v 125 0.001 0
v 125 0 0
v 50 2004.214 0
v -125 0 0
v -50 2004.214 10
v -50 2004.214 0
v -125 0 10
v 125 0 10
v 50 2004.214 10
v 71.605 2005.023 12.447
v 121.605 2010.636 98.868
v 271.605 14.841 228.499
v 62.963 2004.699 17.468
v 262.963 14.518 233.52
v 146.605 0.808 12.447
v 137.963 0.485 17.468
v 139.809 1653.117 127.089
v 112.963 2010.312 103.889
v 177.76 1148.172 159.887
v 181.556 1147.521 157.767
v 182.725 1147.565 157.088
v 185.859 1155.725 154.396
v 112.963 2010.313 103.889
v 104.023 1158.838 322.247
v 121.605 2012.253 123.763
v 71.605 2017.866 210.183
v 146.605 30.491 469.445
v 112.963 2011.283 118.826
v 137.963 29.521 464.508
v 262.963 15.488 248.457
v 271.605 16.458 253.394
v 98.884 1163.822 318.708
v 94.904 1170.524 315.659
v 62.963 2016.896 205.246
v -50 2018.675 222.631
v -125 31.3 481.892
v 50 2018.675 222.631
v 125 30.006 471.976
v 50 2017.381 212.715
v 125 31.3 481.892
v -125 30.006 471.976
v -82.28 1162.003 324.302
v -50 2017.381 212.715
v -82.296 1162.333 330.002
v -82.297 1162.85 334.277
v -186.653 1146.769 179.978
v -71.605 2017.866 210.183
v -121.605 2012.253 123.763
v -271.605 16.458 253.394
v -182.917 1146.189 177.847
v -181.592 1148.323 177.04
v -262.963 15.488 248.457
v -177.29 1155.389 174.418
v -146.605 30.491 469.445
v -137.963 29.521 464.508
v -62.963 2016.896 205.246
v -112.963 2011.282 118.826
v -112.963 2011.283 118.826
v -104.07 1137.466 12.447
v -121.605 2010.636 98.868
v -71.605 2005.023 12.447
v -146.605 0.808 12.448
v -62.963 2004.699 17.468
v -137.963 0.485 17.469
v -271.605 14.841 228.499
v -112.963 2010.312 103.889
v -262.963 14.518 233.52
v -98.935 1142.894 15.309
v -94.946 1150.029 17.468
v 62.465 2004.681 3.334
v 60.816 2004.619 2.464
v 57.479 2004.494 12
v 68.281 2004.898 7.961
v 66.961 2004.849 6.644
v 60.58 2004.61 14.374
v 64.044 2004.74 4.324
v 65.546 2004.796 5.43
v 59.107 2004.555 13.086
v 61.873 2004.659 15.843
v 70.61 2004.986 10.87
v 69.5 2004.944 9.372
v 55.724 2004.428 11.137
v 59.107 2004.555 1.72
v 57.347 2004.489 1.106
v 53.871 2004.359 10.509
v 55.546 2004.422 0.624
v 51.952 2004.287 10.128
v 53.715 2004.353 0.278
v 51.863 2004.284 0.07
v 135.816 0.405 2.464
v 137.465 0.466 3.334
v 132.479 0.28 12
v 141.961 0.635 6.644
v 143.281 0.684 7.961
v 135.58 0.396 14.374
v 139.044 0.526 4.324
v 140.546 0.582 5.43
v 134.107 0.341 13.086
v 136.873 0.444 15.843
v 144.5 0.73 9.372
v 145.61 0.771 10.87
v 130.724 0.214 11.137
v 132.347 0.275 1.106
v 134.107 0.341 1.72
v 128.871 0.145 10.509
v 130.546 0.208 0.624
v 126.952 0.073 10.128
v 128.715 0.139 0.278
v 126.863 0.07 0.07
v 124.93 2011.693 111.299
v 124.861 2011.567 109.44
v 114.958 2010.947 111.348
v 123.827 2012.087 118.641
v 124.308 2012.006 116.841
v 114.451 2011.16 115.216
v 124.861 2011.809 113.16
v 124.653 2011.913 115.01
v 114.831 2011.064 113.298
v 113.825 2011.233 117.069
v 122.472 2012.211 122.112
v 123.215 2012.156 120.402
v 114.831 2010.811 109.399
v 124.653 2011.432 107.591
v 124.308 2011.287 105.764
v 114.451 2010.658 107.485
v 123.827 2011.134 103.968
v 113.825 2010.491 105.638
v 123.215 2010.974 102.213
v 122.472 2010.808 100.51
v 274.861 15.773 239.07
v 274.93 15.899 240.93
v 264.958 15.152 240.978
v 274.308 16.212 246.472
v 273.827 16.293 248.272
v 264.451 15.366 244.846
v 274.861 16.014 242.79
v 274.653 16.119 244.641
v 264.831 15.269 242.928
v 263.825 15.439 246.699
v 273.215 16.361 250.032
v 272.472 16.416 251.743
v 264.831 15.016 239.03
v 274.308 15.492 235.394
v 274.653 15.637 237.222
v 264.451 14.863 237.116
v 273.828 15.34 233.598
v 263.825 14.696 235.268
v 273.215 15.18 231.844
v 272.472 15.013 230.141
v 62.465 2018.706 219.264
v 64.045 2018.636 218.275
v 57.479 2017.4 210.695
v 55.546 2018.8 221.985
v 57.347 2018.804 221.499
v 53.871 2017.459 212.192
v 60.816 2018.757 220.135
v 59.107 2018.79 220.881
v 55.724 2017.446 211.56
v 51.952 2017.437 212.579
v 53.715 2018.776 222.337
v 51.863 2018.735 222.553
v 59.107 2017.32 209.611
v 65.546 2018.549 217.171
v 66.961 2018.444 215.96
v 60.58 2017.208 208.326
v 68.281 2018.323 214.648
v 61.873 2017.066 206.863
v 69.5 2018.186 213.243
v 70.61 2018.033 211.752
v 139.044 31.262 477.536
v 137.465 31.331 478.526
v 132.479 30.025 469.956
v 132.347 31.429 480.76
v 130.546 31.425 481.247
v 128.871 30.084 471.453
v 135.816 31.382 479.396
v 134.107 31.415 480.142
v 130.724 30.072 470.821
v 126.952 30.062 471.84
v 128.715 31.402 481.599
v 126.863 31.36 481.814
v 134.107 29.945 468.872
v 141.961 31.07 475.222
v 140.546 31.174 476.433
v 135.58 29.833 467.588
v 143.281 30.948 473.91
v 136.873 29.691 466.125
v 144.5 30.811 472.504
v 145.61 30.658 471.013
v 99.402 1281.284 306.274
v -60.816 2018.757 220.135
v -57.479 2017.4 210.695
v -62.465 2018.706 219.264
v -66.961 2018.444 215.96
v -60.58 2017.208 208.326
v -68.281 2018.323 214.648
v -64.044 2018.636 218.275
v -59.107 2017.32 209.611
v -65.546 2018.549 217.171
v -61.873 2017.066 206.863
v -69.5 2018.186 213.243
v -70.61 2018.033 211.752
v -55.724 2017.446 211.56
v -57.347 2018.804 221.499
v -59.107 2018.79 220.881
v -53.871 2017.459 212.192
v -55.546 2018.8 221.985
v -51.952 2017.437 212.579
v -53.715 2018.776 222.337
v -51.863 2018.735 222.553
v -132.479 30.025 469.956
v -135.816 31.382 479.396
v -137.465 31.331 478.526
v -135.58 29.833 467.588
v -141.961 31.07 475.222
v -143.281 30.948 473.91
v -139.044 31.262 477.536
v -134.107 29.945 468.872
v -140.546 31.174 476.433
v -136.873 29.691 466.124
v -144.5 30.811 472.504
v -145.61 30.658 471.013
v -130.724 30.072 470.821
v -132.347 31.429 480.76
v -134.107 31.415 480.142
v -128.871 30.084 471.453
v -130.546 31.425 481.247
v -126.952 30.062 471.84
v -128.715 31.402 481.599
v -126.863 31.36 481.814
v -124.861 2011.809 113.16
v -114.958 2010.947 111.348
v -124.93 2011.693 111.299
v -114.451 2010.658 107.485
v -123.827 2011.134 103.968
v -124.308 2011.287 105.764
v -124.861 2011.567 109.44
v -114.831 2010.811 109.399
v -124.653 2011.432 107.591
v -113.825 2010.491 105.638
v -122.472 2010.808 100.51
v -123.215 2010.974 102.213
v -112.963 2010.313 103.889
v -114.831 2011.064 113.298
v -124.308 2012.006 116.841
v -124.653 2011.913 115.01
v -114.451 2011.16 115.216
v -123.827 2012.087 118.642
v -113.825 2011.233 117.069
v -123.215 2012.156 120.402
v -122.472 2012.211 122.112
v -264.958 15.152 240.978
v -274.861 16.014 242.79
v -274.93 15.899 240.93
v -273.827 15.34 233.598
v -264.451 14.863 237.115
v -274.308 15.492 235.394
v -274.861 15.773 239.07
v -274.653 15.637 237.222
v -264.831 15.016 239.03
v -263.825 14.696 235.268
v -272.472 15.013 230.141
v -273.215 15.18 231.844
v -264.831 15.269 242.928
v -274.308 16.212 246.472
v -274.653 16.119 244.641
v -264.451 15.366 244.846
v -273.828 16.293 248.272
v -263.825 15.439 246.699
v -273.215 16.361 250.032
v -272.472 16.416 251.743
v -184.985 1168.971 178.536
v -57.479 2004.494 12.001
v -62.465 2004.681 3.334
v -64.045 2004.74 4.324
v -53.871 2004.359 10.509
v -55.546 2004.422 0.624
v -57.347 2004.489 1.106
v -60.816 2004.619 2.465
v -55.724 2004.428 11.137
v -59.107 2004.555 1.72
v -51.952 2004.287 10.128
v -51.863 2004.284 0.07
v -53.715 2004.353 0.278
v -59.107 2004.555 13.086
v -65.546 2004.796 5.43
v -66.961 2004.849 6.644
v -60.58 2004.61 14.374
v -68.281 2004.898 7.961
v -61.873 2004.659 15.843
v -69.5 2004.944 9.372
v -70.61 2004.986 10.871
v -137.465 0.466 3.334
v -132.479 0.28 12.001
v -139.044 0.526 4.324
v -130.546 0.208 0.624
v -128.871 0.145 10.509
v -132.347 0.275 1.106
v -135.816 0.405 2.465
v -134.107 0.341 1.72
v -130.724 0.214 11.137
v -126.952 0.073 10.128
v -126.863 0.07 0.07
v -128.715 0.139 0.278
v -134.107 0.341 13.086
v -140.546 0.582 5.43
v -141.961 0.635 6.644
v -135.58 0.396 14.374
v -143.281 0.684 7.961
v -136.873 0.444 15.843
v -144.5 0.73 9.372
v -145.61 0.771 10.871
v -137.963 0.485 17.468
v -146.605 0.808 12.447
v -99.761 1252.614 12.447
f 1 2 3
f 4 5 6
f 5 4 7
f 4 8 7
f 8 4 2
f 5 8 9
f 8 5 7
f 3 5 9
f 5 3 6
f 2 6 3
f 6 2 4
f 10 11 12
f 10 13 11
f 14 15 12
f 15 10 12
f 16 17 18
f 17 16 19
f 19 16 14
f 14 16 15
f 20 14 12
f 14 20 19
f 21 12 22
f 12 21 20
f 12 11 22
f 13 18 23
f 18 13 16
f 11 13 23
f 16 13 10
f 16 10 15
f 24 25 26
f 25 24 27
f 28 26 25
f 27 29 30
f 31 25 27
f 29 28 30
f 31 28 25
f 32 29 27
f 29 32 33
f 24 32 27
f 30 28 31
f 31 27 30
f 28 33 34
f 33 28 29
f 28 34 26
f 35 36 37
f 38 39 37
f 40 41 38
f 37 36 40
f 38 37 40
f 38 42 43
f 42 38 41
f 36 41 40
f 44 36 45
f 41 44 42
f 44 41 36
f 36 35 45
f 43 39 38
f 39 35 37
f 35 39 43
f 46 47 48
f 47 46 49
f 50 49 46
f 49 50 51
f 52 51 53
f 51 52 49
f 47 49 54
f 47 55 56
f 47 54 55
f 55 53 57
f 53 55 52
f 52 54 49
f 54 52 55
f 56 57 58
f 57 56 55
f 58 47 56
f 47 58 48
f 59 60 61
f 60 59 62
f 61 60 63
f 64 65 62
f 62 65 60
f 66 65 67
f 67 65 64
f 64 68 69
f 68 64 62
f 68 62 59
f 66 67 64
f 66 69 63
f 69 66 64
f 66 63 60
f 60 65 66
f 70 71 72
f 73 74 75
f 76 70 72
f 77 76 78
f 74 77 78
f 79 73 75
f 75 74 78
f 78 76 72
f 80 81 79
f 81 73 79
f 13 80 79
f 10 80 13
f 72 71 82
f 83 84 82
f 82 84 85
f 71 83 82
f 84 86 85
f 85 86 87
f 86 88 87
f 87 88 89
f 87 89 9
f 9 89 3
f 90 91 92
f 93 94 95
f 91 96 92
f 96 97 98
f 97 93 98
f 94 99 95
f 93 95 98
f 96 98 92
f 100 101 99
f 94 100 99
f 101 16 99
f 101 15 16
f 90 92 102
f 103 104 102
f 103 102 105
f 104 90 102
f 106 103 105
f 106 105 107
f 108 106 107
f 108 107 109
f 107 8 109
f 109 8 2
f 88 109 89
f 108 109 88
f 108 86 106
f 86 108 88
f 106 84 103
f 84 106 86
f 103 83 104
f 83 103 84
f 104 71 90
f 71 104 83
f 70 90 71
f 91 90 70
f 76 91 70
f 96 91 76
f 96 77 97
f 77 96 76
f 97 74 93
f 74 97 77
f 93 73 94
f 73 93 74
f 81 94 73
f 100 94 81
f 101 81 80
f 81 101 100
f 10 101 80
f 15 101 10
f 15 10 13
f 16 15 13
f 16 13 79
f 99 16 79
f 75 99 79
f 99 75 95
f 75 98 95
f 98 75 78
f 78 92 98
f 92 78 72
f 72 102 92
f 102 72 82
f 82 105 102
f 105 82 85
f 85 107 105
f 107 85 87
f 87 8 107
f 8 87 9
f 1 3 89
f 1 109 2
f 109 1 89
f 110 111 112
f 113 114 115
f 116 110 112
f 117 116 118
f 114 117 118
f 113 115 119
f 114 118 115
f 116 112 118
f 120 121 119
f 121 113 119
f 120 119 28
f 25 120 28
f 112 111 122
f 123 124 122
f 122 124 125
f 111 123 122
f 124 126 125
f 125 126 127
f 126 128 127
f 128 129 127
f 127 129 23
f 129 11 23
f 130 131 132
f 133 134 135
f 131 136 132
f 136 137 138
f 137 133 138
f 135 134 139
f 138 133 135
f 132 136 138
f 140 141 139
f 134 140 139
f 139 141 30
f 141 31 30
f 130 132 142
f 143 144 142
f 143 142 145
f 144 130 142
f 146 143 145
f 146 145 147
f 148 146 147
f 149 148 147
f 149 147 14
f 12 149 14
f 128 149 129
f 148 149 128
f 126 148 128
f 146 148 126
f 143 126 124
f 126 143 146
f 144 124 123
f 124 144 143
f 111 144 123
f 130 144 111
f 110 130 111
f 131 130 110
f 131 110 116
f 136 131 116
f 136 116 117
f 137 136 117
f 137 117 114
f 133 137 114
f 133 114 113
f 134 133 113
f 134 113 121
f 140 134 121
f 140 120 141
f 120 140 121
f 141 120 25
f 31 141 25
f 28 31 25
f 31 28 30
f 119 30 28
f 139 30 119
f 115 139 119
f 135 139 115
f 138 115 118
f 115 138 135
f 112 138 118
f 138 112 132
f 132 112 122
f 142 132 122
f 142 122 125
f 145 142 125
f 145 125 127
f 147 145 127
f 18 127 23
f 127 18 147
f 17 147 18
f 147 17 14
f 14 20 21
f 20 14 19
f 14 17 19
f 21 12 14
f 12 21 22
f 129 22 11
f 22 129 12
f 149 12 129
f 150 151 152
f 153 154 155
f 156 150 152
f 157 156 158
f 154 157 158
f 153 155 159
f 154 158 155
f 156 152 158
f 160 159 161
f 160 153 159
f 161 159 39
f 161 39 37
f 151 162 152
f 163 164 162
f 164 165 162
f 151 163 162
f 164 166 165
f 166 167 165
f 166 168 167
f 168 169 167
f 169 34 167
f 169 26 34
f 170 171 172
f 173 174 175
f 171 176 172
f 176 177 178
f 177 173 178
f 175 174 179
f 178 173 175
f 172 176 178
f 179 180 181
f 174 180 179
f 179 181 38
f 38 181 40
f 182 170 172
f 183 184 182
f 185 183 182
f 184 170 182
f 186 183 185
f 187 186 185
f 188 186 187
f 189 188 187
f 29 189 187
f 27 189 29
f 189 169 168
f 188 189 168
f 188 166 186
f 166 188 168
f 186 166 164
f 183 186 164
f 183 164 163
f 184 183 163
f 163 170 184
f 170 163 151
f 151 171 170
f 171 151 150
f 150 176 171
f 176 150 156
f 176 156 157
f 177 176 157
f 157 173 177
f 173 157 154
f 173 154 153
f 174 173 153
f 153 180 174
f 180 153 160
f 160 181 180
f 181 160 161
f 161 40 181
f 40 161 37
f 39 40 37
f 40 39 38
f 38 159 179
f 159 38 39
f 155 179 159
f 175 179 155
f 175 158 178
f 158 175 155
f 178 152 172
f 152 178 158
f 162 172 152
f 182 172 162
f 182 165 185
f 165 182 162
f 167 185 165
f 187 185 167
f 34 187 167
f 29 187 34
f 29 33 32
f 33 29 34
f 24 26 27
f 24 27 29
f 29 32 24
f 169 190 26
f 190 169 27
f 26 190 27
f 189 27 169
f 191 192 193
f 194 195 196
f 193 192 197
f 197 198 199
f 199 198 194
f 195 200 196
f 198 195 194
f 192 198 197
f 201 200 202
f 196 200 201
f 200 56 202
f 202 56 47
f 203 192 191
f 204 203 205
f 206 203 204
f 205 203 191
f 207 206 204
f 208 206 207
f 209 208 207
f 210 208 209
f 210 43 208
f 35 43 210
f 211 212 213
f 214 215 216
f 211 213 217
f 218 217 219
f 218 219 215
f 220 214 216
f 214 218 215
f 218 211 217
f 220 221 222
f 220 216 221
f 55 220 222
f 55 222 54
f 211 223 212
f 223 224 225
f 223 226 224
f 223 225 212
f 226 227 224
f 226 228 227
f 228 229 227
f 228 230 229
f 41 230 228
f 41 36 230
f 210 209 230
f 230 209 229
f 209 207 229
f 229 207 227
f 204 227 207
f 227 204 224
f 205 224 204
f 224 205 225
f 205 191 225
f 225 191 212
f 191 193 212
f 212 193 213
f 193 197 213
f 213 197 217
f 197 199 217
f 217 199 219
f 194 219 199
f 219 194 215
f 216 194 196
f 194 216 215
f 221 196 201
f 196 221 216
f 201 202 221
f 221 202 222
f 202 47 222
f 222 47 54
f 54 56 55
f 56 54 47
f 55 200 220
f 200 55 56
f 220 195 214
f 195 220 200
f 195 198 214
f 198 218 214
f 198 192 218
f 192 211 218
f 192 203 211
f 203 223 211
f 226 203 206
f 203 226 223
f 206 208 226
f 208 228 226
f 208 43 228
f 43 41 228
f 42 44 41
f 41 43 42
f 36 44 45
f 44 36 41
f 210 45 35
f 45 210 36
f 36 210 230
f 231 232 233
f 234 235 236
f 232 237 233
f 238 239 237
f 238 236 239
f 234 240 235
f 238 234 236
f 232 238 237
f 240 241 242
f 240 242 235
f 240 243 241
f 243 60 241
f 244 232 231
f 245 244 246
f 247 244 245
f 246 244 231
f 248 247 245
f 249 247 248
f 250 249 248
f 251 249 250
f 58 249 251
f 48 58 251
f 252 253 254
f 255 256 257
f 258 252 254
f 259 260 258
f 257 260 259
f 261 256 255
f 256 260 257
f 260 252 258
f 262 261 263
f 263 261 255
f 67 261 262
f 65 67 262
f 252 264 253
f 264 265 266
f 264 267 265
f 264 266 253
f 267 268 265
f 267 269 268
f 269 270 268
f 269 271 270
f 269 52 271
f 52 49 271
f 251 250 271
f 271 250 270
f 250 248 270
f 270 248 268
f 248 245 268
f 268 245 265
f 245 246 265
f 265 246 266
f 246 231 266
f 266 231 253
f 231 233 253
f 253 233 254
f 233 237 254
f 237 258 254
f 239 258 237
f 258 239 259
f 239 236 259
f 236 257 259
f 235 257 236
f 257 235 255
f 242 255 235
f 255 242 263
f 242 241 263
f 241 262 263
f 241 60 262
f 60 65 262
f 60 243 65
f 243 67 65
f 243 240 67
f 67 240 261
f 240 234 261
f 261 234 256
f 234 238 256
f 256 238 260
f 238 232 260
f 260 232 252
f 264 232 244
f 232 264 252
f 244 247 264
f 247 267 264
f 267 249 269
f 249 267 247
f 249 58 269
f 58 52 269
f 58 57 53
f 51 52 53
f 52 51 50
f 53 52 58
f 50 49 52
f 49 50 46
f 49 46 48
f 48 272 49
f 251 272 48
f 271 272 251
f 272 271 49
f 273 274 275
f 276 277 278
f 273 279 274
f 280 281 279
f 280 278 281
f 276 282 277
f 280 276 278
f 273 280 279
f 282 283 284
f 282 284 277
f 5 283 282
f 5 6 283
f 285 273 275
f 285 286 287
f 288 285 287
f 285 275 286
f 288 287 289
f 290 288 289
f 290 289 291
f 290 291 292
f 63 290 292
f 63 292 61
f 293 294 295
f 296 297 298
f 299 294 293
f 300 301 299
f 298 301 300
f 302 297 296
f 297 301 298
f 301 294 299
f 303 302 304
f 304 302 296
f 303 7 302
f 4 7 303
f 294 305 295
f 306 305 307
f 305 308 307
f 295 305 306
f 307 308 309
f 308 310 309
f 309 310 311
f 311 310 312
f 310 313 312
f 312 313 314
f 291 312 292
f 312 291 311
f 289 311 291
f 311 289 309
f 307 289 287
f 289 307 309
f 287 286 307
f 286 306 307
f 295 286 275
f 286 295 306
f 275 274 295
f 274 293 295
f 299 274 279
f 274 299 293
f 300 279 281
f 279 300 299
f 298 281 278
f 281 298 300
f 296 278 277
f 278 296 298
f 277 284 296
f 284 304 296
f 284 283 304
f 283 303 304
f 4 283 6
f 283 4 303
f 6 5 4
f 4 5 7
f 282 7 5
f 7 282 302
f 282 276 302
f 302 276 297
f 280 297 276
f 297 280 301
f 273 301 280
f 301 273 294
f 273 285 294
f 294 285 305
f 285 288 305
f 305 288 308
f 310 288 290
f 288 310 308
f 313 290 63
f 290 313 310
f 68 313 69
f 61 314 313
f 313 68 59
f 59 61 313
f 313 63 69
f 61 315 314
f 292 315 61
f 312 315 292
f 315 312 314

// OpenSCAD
// Generated by Parametrix
ca_sfTube_SFG_pattern_000 = [ [ -125.0000, 0.0000 ],[ 125.0000, 0.0000 ],[ 145.8808, 0.7814 ],[ 395.1816, 19.4658 ],[ 415.9456, 21.8056 ],[ 663.1527, 59.0699 ],[ 683.6838, 62.9550 ],[ 927.4145, 118.5907 ],[ 947.5978, 123.9994 ],[ 1186.4887, 197.6954 ],[ 1206.2113, 204.5974 ],[ 1438.9263, 295.9415 ],[ 1458.0779, 304.2982 ],[ 655.9711, 2142.5377 ],[ 636.8196, 2134.1810 ],[ 543.7336, 2097.6434 ],[ 524.0110, 2090.7414 ],[ 428.4546, 2061.2630 ],[ 408.2713, 2055.8544 ],[ 310.7790, 2033.6000 ],[ 290.2480, 2029.7150 ],[ 191.3651, 2014.8092 ],[ 170.6011, 2012.4695 ],[ 70.8808, 2004.9957 ],[ 50.0000, 2004.2143 ],[ -50.0000, 2004.2143 ],[ -125.0000, 0.0000 ] ];
cb_sfTube_SFG_pattern_000 = [  0, 1, 2, 3, 4, 5, 6, 7, 8, 9, 10, 11, 12, 13, 14, 15, 16, 17, 18, 19, 20, 21, 22, 23, 24, 25, 26 ];
ca_sfTube_SFG_pattern_001 = [ [ -125.0000, 0.0000 ],[ 125.0000, 0.0000 ],[ 145.8808, 0.7814 ],[ 395.1816, 19.4658 ],[ 415.9456, 21.8056 ],[ 663.1527, 59.0699 ],[ 683.6838, 62.9550 ],[ 927.4145, 118.5907 ],[ 947.5978, 123.9994 ],[ 1186.4887, 197.6954 ],[ 1206.2113, 204.5974 ],[ 1438.9263, 295.9415 ],[ 1458.0779, 304.2982 ],[ 655.9711, 2142.5377 ],[ 636.8196, 2134.1810 ],[ 543.7336, 2097.6434 ],[ 524.0110, 2090.7414 ],[ 428.4546, 2061.2630 ],[ 408.2713, 2055.8544 ],[ 310.7790, 2033.6000 ],[ 290.2480, 2029.7150 ],[ 191.3651, 2014.8092 ],[ 170.6011, 2012.4695 ],[ 70.8808, 2004.9957 ],[ 50.0000, 2004.2143 ],[ -50.0000, 2004.2143 ],[ -125.0000, 0.0000 ] ];
cb_sfTube_SFG_pattern_001 = [  27, 28, 29, 30, 31, 32, 33, 34, 35, 36, 37, 38, 39, 40, 41, 42, 43, 44, 45, 46, 47, 48, 49, 50, 51, 52, 53 ];
ca_sfTube_SFG_pattern_002 = [ [ 107.4189, 1001.8518 ],[ 107.6019, 1001.8757 ],[ 107.7774, 1001.9328 ],[ 107.9393, 1002.0212 ],[ 108.0824, 1002.1378 ],[ 108.2015, 1002.2788 ],[ 108.2927, 1002.4392 ],[ 108.3529, 1002.6136 ],[ 108.3800, 1002.7962 ],[ 108.3731, 1002.9806 ],[ 108.3324, 1003.1606 ],[ 108.2594, 1003.3300 ],[ 108.1564, 1003.4832 ],[ 108.0271, 1003.6148 ],[ 107.8758, 1003.7205 ],[ 107.7076, 1003.7965 ],[ 107.5284, 1003.8403 ],[ 107.3441, 1003.8504 ],[ 88.4619, 1003.1439 ],[ 88.2789, 1003.1200 ],[ 88.1034, 1003.0629 ],[ 87.9414, 1002.9745 ],[ 87.7984, 1002.8578 ],[ 87.6793, 1002.7169 ],[ 87.5881, 1002.5565 ],[ 87.5279, 1002.3821 ],[ 87.5008, 1002.1995 ],[ 87.5077, 1002.0151 ],[ 87.5484, 1001.8351 ],[ 87.6214, 1001.6656 ],[ 87.7244, 1001.5125 ],[ 87.8537, 1001.3809 ],[ 88.0050, 1001.2752 ],[ 88.1732, 1001.1992 ],[ 88.3524, 1001.1554 ],[ 88.5367, 1001.1452 ],[ 107.4189, 1001.8518 ] ];
cb_sfTube_SFG_pattern_002 = [  54, 55, 56, 57, 58, 59, 60, 61, 62, 63, 64, 65, 66, 67, 68, 69, 70, 71, 72, 73, 74, 75, 76, 77, 78, 79, 80, 81, 82, 83, 84, 85, 86, 87, 88, 89, 90 ];
ca_sfTube_SFG_pattern_003 = [ [ 302.7736, 1017.2017 ],[ 302.9543, 1017.2392 ],[ 303.1250, 1017.3093 ],[ 303.2800, 1017.4095 ],[ 303.4139, 1017.5365 ],[ 303.5221, 1017.6859 ],[ 303.6011, 1017.8527 ],[ 303.6481, 1018.0312 ],[ 303.6614, 1018.2152 ],[ 303.6408, 1018.3986 ],[ 303.5868, 1018.5751 ],[ 303.5013, 1018.7386 ],[ 303.3872, 1018.8836 ],[ 303.2484, 1019.0052 ],[ 303.0896, 1019.0992 ],[ 302.9162, 1019.1625 ],[ 302.7342, 1019.1928 ],[ 302.5497, 1019.1891 ],[ 283.7731, 1017.0733 ],[ 283.5924, 1017.0358 ],[ 283.4217, 1016.9658 ],[ 283.2667, 1016.8655 ],[ 283.1329, 1016.7385 ],[ 283.0246, 1016.5891 ],[ 282.9456, 1016.4223 ],[ 282.8986, 1016.2438 ],[ 282.8853, 1016.0598 ],[ 282.9059, 1015.8764 ],[ 282.9599, 1015.7000 ],[ 283.0454, 1015.5364 ],[ 283.1596, 1015.3914 ],[ 283.2984, 1015.2698 ],[ 283.4572, 1015.1758 ],[ 283.6305, 1015.1125 ],[ 283.8125, 1015.0822 ],[ 283.9970, 1015.0859 ],[ 302.7736, 1017.2017 ] ];
cb_sfTube_SFG_pattern_003 = [  91, 92, 93, 94, 95, 96, 97, 98, 99, 100, 101, 102, 103, 104, 105, 106, 107, 108, 109, 110, 111, 112, 113, 114, 115, 116, 117, 118, 119, 120, 121, 122, 123, 124, 125, 126, 127 ];
ca_sfTube_SFG_pattern_004 = [ [ 496.4348, 1047.1090 ],[ 496.6122, 1047.1599 ],[ 496.7772, 1047.2425 ],[ 496.9242, 1047.3541 ],[ 497.0482, 1047.4907 ],[ 497.1450, 1047.6478 ],[ 497.2113, 1047.8200 ],[ 497.2448, 1048.0015 ],[ 497.2444, 1048.1861 ],[ 497.2101, 1048.3674 ],[ 497.1430, 1048.5393 ],[ 497.0455, 1048.6960 ],[ 496.9209, 1048.8321 ],[ 496.7734, 1048.9430 ],[ 496.6080, 1049.0248 ],[ 496.4304, 1049.0750 ],[ 496.2466, 1049.0916 ],[ 496.0629, 1049.0741 ],[ 477.4970, 1045.5609 ],[ 477.3089, 1045.5058 ],[ 477.1351, 1045.4150 ],[ 476.9824, 1045.2920 ],[ 476.8567, 1045.1417 ],[ 476.7626, 1044.9696 ],[ 476.7040, 1044.7826 ],[ 476.6830, 1044.5877 ],[ 476.7004, 1044.3924 ],[ 476.7555, 1044.2043 ],[ 476.8463, 1044.0306 ],[ 476.9692, 1043.8779 ],[ 477.1196, 1043.7521 ],[ 477.2916, 1043.6581 ],[ 477.4787, 1043.5994 ],[ 477.6736, 1043.5784 ],[ 477.8688, 1043.5958 ],[ 496.4348, 1047.1090 ] ];
cb_sfTube_SFG_pattern_004 = [  128, 129, 130, 131, 132, 133, 134, 135, 136, 137, 138, 139, 140, 141, 142, 143, 144, 145, 146, 147, 148, 149, 150, 151, 152, 153, 154, 155, 156, 157, 158, 159, 160, 161, 162, 163 ];
ca_sfTube_SFG_pattern_005 = [ [ 687.3191, 1091.4064 ],[ 687.4922, 1091.4705 ],[ 687.6506, 1091.5652 ],[ 687.7888, 1091.6874 ],[ 687.9023, 1091.8329 ],[ 687.9871, 1091.9968 ],[ 688.0403, 1092.1735 ],[ 688.0601, 1092.3570 ],[ 688.0459, 1092.5410 ],[ 687.9982, 1092.7192 ],[ 687.9185, 1092.8857 ],[ 687.8095, 1093.0346 ],[ 687.6751, 1093.1610 ],[ 687.5197, 1093.2606 ],[ 687.3487, 1093.3299 ],[ 687.1678, 1093.3666 ],[ 686.9833, 1093.3694 ],[ 686.8014, 1093.3383 ],[ 668.5500, 1088.4473 ],[ 668.3769, 1088.3833 ],[ 668.2185, 1088.2886 ],[ 668.0803, 1088.1664 ],[ 667.9668, 1088.0208 ],[ 667.8820, 1087.8569 ],[ 667.8288, 1087.6802 ],[ 667.8089, 1087.4968 ],[ 667.8231, 1087.3128 ],[ 667.8709, 1087.1345 ],[ 667.9506, 1086.9681 ],[ 668.0595, 1086.8191 ],[ 668.1940, 1086.6927 ],[ 668.3494, 1086.5932 ],[ 668.5204, 1086.5239 ],[ 668.7013, 1086.4872 ],[ 668.8858, 1086.4844 ],[ 669.0677, 1086.5155 ],[ 687.3191, 1091.4064 ] ];
cb_sfTube_SFG_pattern_005 = [  164, 165, 166, 167, 168, 169, 170, 171, 172, 173, 174, 175, 176, 177, 178, 179, 180, 181, 182, 183, 184, 185, 186, 187, 188, 189, 190, 191, 192, 193, 194, 195, 196, 197, 198, 199, 200 ];
ca_sfTube_SFG_pattern_006 = [ [ 874.3589, 1149.8462 ],[ 874.5267, 1149.9230 ],[ 874.6776, 1150.0293 ],[ 874.8063, 1150.1615 ],[ 874.9086, 1150.3151 ],[ 874.9809, 1150.4849 ],[ 875.0207, 1150.6651 ],[ 875.0268, 1150.8495 ],[ 874.9989, 1151.0319 ],[ 874.9379, 1151.2061 ],[ 874.8460, 1151.3661 ],[ 874.7263, 1151.5065 ],[ 874.5827, 1151.6225 ],[ 874.4204, 1151.7102 ],[ 874.2446, 1151.7665 ],[ 874.0615, 1151.7896 ],[ 873.8773, 1151.7786 ],[ 873.6983, 1151.7340 ],[ 855.8634, 1145.4926 ],[ 855.6856, 1145.4100 ],[ 855.5274, 1145.2944 ],[ 855.3947, 1145.1500 ],[ 855.2927, 1144.9826 ],[ 855.2254, 1144.7985 ],[ 855.1953, 1144.6048 ],[ 855.2036, 1144.4089 ],[ 855.2499, 1144.2184 ],[ 855.3324, 1144.0406 ],[ 855.4481, 1143.8824 ],[ 855.5924, 1143.7497 ],[ 855.7599, 1143.6477 ],[ 855.9440, 1143.5804 ],[ 856.1377, 1143.5503 ],[ 856.3336, 1143.5586 ],[ 856.5240, 1143.6049 ],[ 874.3589, 1149.8462 ] ];
cb_sfTube_SFG_pattern_006 = [  201, 202, 203, 204, 205, 206, 207, 208, 209, 210, 211, 212, 213, 214, 215, 216, 217, 218, 219, 220, 221, 222, 223, 224, 225, 226, 227, 228, 229, 230, 231, 232, 233, 234, 235, 236 ];
ca_sfTube_SFG_pattern_007 = [ [ 1056.5079, 1222.1015 ],[ 1056.6790, 1222.1971 ],[ 1056.8282, 1222.3243 ],[ 1056.9497, 1222.4781 ],[ 1057.0389, 1222.6527 ],[ 1057.0923, 1222.8413 ],[ 1057.1078, 1223.0368 ],[ 1057.0849, 1223.2315 ],[ 1057.0245, 1223.4180 ],[ 1056.9289, 1223.5891 ],[ 1056.8017, 1223.7383 ],[ 1056.6479, 1223.8598 ],[ 1056.4733, 1223.9489 ],[ 1056.2847, 1224.0023 ],[ 1056.0892, 1224.0178 ],[ 1055.8946, 1223.9950 ],[ 1055.7081, 1223.9346 ],[ 1038.3896, 1216.3777 ],[ 1038.2279, 1216.2886 ],[ 1038.0855, 1216.1714 ],[ 1037.9670, 1216.0299 ],[ 1037.8765, 1215.8691 ],[ 1037.8171, 1215.6944 ],[ 1037.7908, 1215.5117 ],[ 1037.7985, 1215.3273 ],[ 1037.8399, 1215.1475 ],[ 1037.9137, 1214.9784 ],[ 1038.0174, 1214.8257 ],[ 1038.1473, 1214.6946 ],[ 1038.2991, 1214.5897 ],[ 1038.4676, 1214.5144 ],[ 1038.6470, 1214.4714 ],[ 1038.8313, 1214.4621 ],[ 1039.0142, 1214.4868 ],[ 1039.1894, 1214.5446 ],[ 1056.5079, 1222.1015 ] ];
cb_sfTube_SFG_pattern_007 = [  237, 238, 239, 240, 241, 242, 243, 244, 245, 246, 247, 248, 249, 250, 251, 252, 253, 254, 255, 256, 257, 258, 259, 260, 261, 262, 263, 264, 265, 266, 267, 268, 269, 270, 271, 272 ];
a_sfTube_SFG_pattern = concat(ca_sfTube_SFG_pattern_000, ca_sfTube_SFG_pattern_001, ca_sfTube_SFG_pattern_002, ca_sfTube_SFG_pattern_003, ca_sfTube_SFG_pattern_004, ca_sfTube_SFG_pattern_005, ca_sfTube_SFG_pattern_006, ca_sfTube_SFG_pattern_007);
b_sfTube_SFG_pattern = [cb_sfTube_SFG_pattern_000, cb_sfTube_SFG_pattern_001, cb_sfTube_SFG_pattern_002, cb_sfTube_SFG_pattern_003, cb_sfTube_SFG_pattern_004, cb_sfTube_SFG_pattern_005, cb_sfTube_SFG_pattern_006, cb_sfTube_SFG_pattern_007];
ca_sfTube_SFG_profiles_000 = [ [ 0.0000, 0.0000 ],[ 30.4748, 0.0000 ],[ 30.4748, 10.0000 ],[ 0.0000, 10.0000 ],[ 0.0000, 0.0000 ] ];
cb_sfTube_SFG_profiles_000 = [  0, 1, 2, 3, 4 ];
ca_sfTube_SFG_profiles_001 = [ [ 30.4748, 0.0000 ],[ 32.3387, 0.0696 ],[ 34.1922, 0.2779 ],[ 36.0251, 0.6239 ],[ 37.8271, 1.1056 ],[ 39.5881, 1.7202 ],[ 41.2984, 2.4645 ],[ 42.9485, 3.3342 ],[ 44.5291, 4.3245 ],[ 46.0315, 5.4299 ],[ 47.4473, 6.6443 ],[ 48.7686, 7.9608 ],[ 49.9881, 9.3721 ],[ 51.0989, 10.8705 ],[ 52.0950, 12.4475 ],[ 43.4469, 17.4685 ],[ 42.3556, 15.8433 ],[ 41.0620, 14.3741 ],[ 39.5881, 13.0859 ],[ 37.9590, 12.0005 ],[ 36.2024, 11.1366 ],[ 34.3482, 10.5088 ],[ 32.4281, 10.1277 ],[ 30.4748, 10.0000 ],[ 30.4748, 0.0000 ] ];
cb_sfTube_SFG_profiles_001 = [  5, 6, 7, 8, 9, 10, 11, 12, 13, 14, 15, 16, 17, 18, 19, 20, 21, 22, 23, 24, 25, 26, 27, 28, 29 ];
ca_sfTube_SFG_profiles_002 = [ [ 52.0950, 12.4475 ],[ 67.3964, 38.8023 ],[ 58.7483, 43.8233 ],[ 43.4469, 17.4685 ],[ 52.0950, 12.4475 ] ];
cb_sfTube_SFG_profiles_002 = [  30, 31, 32, 33, 34 ];
ca_sfTube_SFG_profiles_003 = [ [ 67.3964, 38.8023 ],[ 68.2721, 40.4492 ],[ 69.0226, 42.1568 ],[ 69.6436, 43.9156 ],[ 70.1319, 45.7158 ],[ 70.4845, 47.5474 ],[ 70.6996, 49.4002 ],[ 70.7760, 51.2638 ],[ 70.7132, 53.1280 ],[ 70.5116, 54.9823 ],[ 70.1723, 56.8164 ],[ 69.6972, 58.6201 ],[ 69.0889, 60.3834 ],[ 68.3509, 62.0964 ],[ 67.4872, 63.7496 ],[ 58.8028, 58.7917 ],[ 59.6603, 57.0320 ],[ 60.2814, 55.1756 ],[ 60.6554, 53.2541 ],[ 60.7760, 51.3002 ],[ 60.6412, 49.3473 ],[ 60.2532, 47.4286 ],[ 59.6186, 45.5768 ],[ 58.7483, 43.8233 ],[ 67.3964, 38.8023 ] ];
cb_sfTube_SFG_profiles_003 = [  35, 36, 37, 38, 39, 40, 41, 42, 43, 44, 45, 46, 47, 48, 49, 50, 51, 52, 53, 54, 55, 56, 57, 58, 59 ];
ca_sfTube_SFG_profiles_004 = [ [ 67.4872, 63.7496 ],[ 52.3781, 90.2152 ],[ 43.6937, 85.2573 ],[ 58.8028, 58.7917 ],[ 67.4872, 63.7496 ] ];
cb_sfTube_SFG_profiles_004 = [  60, 61, 62, 63, 64 ];
ca_sfTube_SFG_profiles_005 = [ [ 52.3781, 90.2152 ],[ 51.3936, 91.7994 ],[ 50.2937, 93.3058 ],[ 49.0845, 94.7260 ],[ 47.7728, 96.0521 ],[ 46.3659, 97.2767 ],[ 44.8716, 98.3930 ],[ 43.2982, 99.3948 ],[ 41.6545, 100.2765 ],[ 39.9497, 101.0332 ],[ 38.1932, 101.6607 ],[ 36.3948, 102.1554 ],[ 34.5645, 102.5148 ],[ 32.7125, 102.7366 ],[ 30.8491, 102.8198 ],[ 30.7763, 92.8200 ],[ 32.7287, 92.6781 ],[ 34.6460, 92.2831 ],[ 36.4955, 91.6418 ],[ 38.2457, 90.7651 ],[ 39.8669, 89.6679 ],[ 41.3314, 88.3689 ],[ 42.6143, 86.8903 ],[ 43.6937, 85.2573 ],[ 52.3781, 90.2152 ] ];
cb_sfTube_SFG_profiles_005 = [  65, 66, 67, 68, 69, 70, 71, 72, 73, 74, 75, 76, 77, 78, 79, 80, 81, 82, 83, 84, 85, 86, 87, 88, 89 ];
ca_sfTube_SFG_profiles_006 = [ [ 30.8491, 102.8198 ],[ 0.3752, 103.0417 ],[ 0.3023, 93.0419 ],[ 30.7763, 92.8200 ],[ 30.8491, 102.8198 ] ];
cb_sfTube_SFG_profiles_006 = [  90, 91, 92, 93, 94 ];
ca_sfTube_SFG_profiles_007 = [ [ 0.3752, 103.0417 ],[ -1.4892, 102.9857 ],[ -3.3443, 102.7908 ],[ -5.1796, 102.4582 ],[ -6.9850, 101.9896 ],[ -8.7505, 101.3878 ],[ -10.4662, 100.6560 ],[ -12.1225, 99.7984 ],[ -13.7103, 98.8196 ],[ -15.2207, 97.7252 ],[ -16.6453, 96.5212 ],[ -17.9762, 95.2143 ],[ -19.2059, 93.8119 ],[ -20.3276, 92.3216 ],[ -21.3351, 90.7519 ],[ -12.7238, 85.6681 ],[ -11.6208, 87.2853 ],[ -10.3165, 88.7450 ],[ -8.8333, 90.0225 ],[ -7.1963, 91.0959 ],[ -5.4334, 91.9471 ],[ -3.5748, 92.5614 ],[ -1.6519, 92.9284 ],[ 0.3023, 93.0419 ],[ 0.3752, 103.0417 ] ];
cb_sfTube_SFG_profiles_007 = [  95, 96, 97, 98, 99, 100, 101, 102, 103, 104, 105, 106, 107, 108, 109, 110, 111, 112, 113, 114, 115, 116, 117, 118, 119 ];
ca_sfTube_SFG_profiles_008 = [ [ -21.3351, 90.7519 ],[ -36.8280, 64.5092 ],[ -28.2167, 59.4253 ],[ -12.7238, 85.6681 ],[ -21.3351, 90.7519 ] ];
cb_sfTube_SFG_profiles_008 = [  120, 121, 122, 123, 124 ];
ca_sfTube_SFG_profiles_009 = [ [ -36.8280, 64.5092 ],[ -37.7157, 62.8687 ],[ -38.4786, 61.1667 ],[ -39.1125, 59.4124 ],[ -39.6138, 57.6158 ],[ -39.9798, 55.7869 ],[ -40.2083, 53.9357 ],[ -40.2983, 52.0726 ],[ -40.2491, 50.2081 ],[ -40.0610, 48.3523 ],[ -39.7350, 46.5158 ],[ -39.2731, 44.7087 ],[ -38.6777, 42.9410 ],[ -37.9521, 41.2227 ],[ -37.1005, 39.5632 ],[ -28.3802, 44.4578 ],[ -29.2249, 46.2237 ],[ -29.8325, 48.0846 ],[ -30.1925, 50.0088 ],[ -30.2989, 51.9634 ],[ -30.1498, 53.9153 ],[ -29.7478, 55.8311 ],[ -29.0998, 57.6783 ],[ -28.2167, 59.4253 ],[ -36.8280, 64.5092 ] ];
cb_sfTube_SFG_profiles_009 = [  125, 126, 127, 128, 129, 130, 131, 132, 133, 134, 135, 136, 137, 138, 139, 140, 141, 142, 143, 144, 145, 146, 147, 148, 149 ];
ca_sfTube_SFG_profiles_010 = [ [ -37.1005, 39.5632 ],[ -22.1845, 12.9884 ],[ -13.4642, 17.8829 ],[ -28.3802, 44.4578 ],[ -37.1005, 39.5632 ] ];
cb_sfTube_SFG_profiles_010 = [  150, 151, 152, 153, 154 ];
ca_sfTube_SFG_profiles_011 = [ [ 0.0000, 721.8990 ],[ 180.4748, 721.8990 ],[ 180.4748, 731.8990 ],[ 0.0000, 731.8990 ],[ 0.0000, 721.8990 ] ];
cb_sfTube_SFG_profiles_011 = [  155, 156, 157, 158, 159 ];
ca_sfTube_SFG_profiles_012 = [ [ 180.4748, 721.8990 ],[ 182.3387, 721.9686 ],[ 184.1922, 722.1770 ],[ 186.0251, 722.5229 ],[ 187.8271, 723.0046 ],[ 189.5881, 723.6193 ],[ 191.2984, 724.3635 ],[ 192.9485, 725.2332 ],[ 194.5291, 726.2235 ],[ 196.0315, 727.3289 ],[ 197.4473, 728.5433 ],[ 198.7686, 729.8598 ],[ 199.9881, 731.2712 ],[ 201.0989, 732.7695 ],[ 202.0950, 734.3465 ],[ 193.4469, 739.3675 ],[ 192.3556, 737.7424 ],[ 191.0620, 736.2731 ],[ 189.5881, 734.9849 ],[ 187.9590, 733.8996 ],[ 186.2024, 733.0356 ],[ 184.3482, 732.4078 ],[ 182.4281, 732.0268 ],[ 180.4748, 731.8990 ],[ 180.4748, 721.8990 ] ];
cb_sfTube_SFG_profiles_012 = [  160, 161, 162, 163, 164, 165, 166, 167, 168, 169, 170, 171, 172, 173, 174, 175, 176, 177, 178, 179, 180, 181, 182, 183, 184 ];
ca_sfTube_SFG_profiles_013 = [ [ 202.0950, 734.3465 ],[ 292.7115, 890.4228 ],[ 284.0634, 895.4438 ],[ 193.4469, 739.3675 ],[ 202.0950, 734.3465 ] ];
cb_sfTube_SFG_profiles_013 = [  185, 186, 187, 188, 189 ];
ca_sfTube_SFG_profiles_014 = [ [ 292.7115, 890.4228 ],[ 293.5872, 892.0696 ],[ 294.3376, 893.7772 ],[ 294.9587, 895.5360 ],[ 295.4469, 897.3362 ],[ 295.7996, 899.1678 ],[ 296.0147, 901.0206 ],[ 296.0911, 902.8843 ],[ 296.0283, 904.7484 ],[ 295.8267, 906.6027 ],[ 295.4874, 908.4368 ],[ 295.0123, 910.2405 ],[ 294.4040, 912.0038 ],[ 293.6660, 913.7168 ],[ 292.8023, 915.3700 ],[ 284.1179, 910.4121 ],[ 284.9754, 908.6524 ],[ 285.5965, 906.7960 ],[ 285.9705, 904.8745 ],[ 286.0911, 902.9207 ],[ 285.9563, 900.9678 ],[ 285.5683, 899.0490 ],[ 284.9337, 897.1972 ],[ 284.0634, 895.4438 ],[ 292.7115, 890.4228 ] ];
cb_sfTube_SFG_profiles_014 = [  190, 191, 192, 193, 194, 195, 196, 197, 198, 199, 200, 201, 202, 203, 204, 205, 206, 207, 208, 209, 210, 211, 212, 213, 214 ];
ca_sfTube_SFG_profiles_015 = [ [ 292.8023, 915.3700 ],[ 203.3247, 1072.1019 ],[ 194.6403, 1067.1440 ],[ 284.1179, 910.4121 ],[ 292.8023, 915.3700 ] ];
cb_sfTube_SFG_profiles_015 = [  215, 216, 217, 218, 219 ];
ca_sfTube_SFG_profiles_016 = [ [ 203.3247, 1072.1019 ],[ 202.3401, 1073.6862 ],[ 201.2402, 1075.1926 ],[ 200.0310, 1076.6128 ],[ 198.7193, 1077.9389 ],[ 197.3124, 1079.1635 ],[ 195.8181, 1080.2798 ],[ 194.2448, 1081.2816 ],[ 192.6011, 1082.1633 ],[ 190.8962, 1082.9200 ],[ 189.1397, 1083.5474 ],[ 187.3413, 1084.0422 ],[ 185.5110, 1084.4015 ],[ 183.6590, 1084.6234 ],[ 181.7957, 1084.7065 ],[ 181.7228, 1074.7068 ],[ 183.6752, 1074.5648 ],[ 185.5925, 1074.1698 ],[ 187.4420, 1073.5285 ],[ 189.1923, 1072.6518 ],[ 190.8135, 1071.5547 ],[ 192.2780, 1070.2557 ],[ 193.5609, 1068.7771 ],[ 194.6403, 1067.1440 ],[ 203.3247, 1072.1019 ] ];
cb_sfTube_SFG_profiles_016 = [  220, 221, 222, 223, 224, 225, 226, 227, 228, 229, 230, 231, 232, 233, 234, 235, 236, 237, 238, 239, 240, 241, 242, 243, 244 ];
ca_sfTube_SFG_profiles_017 = [ [ 181.7957, 1084.7065 ],[ 1.3257, 1086.0206 ],[ 1.2529, 1076.0209 ],[ 181.7228, 1074.7068 ],[ 181.7957, 1084.7065 ] ];
cb_sfTube_SFG_profiles_017 = [  245, 246, 247, 248, 249 ];
ca_sfTube_SFG_profiles_018 = [ [ 1.3257, 1086.0206 ],[ -0.5387, 1085.9646 ],[ -2.3937, 1085.7698 ],[ -4.2291, 1085.4372 ],[ -6.0345, 1084.9686 ],[ -7.8000, 1084.3668 ],[ -9.5156, 1083.6350 ],[ -11.1720, 1082.7773 ],[ -12.7598, 1081.7986 ],[ -14.2702, 1080.7041 ],[ -15.6948, 1079.5002 ],[ -17.0256, 1078.1933 ],[ -18.2554, 1076.7909 ],[ -19.3771, 1075.3006 ],[ -20.3846, 1073.7309 ],[ -11.7733, 1068.6471 ],[ -10.6702, 1070.2642 ],[ -9.3660, 1071.7240 ],[ -7.8827, 1073.0015 ],[ -6.2457, 1074.0749 ],[ -4.4829, 1074.9261 ],[ -2.6242, 1075.5404 ],[ -0.7014, 1075.9074 ],[ 1.2529, 1076.0209 ],[ 1.3257, 1086.0206 ] ];
cb_sfTube_SFG_profiles_018 = [  250, 251, 252, 253, 254, 255, 256, 257, 258, 259, 260, 261, 262, 263, 264, 265, 266, 267, 268, 269, 270, 271, 272, 273, 274 ];
ca_sfTube_SFG_profiles_019 = [ [ -20.3846, 1073.7309 ],[ -112.1351, 918.3186 ],[ -103.5238, 913.2348 ],[ -11.7733, 1068.6471 ],[ -20.3846, 1073.7309 ] ];
cb_sfTube_SFG_profiles_019 = [  275, 276, 277, 278, 279 ];
ca_sfTube_SFG_profiles_020 = [ [ -112.1351, 918.3186 ],[ -113.0228, 916.6782 ],[ -113.7857, 914.9761 ],[ -114.4196, 913.2219 ],[ -114.9209, 911.4253 ],[ -115.2869, 909.5963 ],[ -115.5155, 907.7451 ],[ -115.6054, 905.8821 ],[ -115.5562, 904.0175 ],[ -115.3681, 902.1618 ],[ -115.0421, 900.3252 ],[ -114.5802, 898.5181 ],[ -113.9848, 896.7505 ],[ -113.2592, 895.0321 ],[ -112.4076, 893.3727 ],[ -103.6873, 898.2672 ],[ -104.5320, 900.0331 ],[ -105.1396, 901.8940 ],[ -105.4996, 903.8182 ],[ -105.6060, 905.7729 ],[ -105.4569, 907.7247 ],[ -105.0549, 909.6406 ],[ -104.4069, 911.4877 ],[ -103.5238, 913.2348 ],[ -112.1351, 918.3186 ] ];
cb_sfTube_SFG_profiles_020 = [  280, 281, 282, 283, 284, 285, 286, 287, 288, 289, 290, 291, 292, 293, 294, 295, 296, 297, 298, 299, 300, 301, 302, 303, 304 ];
ca_sfTube_SFG_profiles_021 = [ [ -112.4076, 893.3727 ],[ -24.0736, 735.9934 ],[ -15.3533, 740.8879 ],[ -103.6873, 898.2672 ],[ -112.4076, 893.3727 ] ];
cb_sfTube_SFG_profiles_021 = [  305, 306, 307, 308, 309 ];
a_sfTube_SFG_profiles = concat(ca_sfTube_SFG_profiles_000, ca_sfTube_SFG_profiles_001, ca_sfTube_SFG_profiles_002, ca_sfTube_SFG_profiles_003, ca_sfTube_SFG_profiles_004, ca_sfTube_SFG_profiles_005, ca_sfTube_SFG_profiles_006, ca_sfTube_SFG_profiles_007, ca_sfTube_SFG_profiles_008, ca_sfTube_SFG_profiles_009, ca_sfTube_SFG_profiles_010, ca_sfTube_SFG_profiles_011, ca_sfTube_SFG_profiles_012, ca_sfTube_SFG_profiles_013, ca_sfTube_SFG_profiles_014, ca_sfTube_SFG_profiles_015, ca_sfTube_SFG_profiles_016, ca_sfTube_SFG_profiles_017, ca_sfTube_SFG_profiles_018, ca_sfTube_SFG_profiles_019, ca_sfTube_SFG_profiles_020, ca_sfTube_SFG_profiles_021);
b_sfTube_SFG_profiles = [cb_sfTube_SFG_profiles_000, cb_sfTube_SFG_profiles_001, cb_sfTube_SFG_profiles_002, cb_sfTube_SFG_profiles_003, cb_sfTube_SFG_profiles_004, cb_sfTube_SFG_profiles_005, cb_sfTube_SFG_profiles_006, cb_sfTube_SFG_profiles_007, cb_sfTube_SFG_profiles_008, cb_sfTube_SFG_profiles_009, cb_sfTube_SFG_profiles_010, cb_sfTube_SFG_profiles_011, cb_sfTube_SFG_profiles_012, cb_sfTube_SFG_profiles_013, cb_sfTube_SFG_profiles_014, cb_sfTube_SFG_profiles_015, cb_sfTube_SFG_profiles_016, cb_sfTube_SFG_profiles_017, cb_sfTube_SFG_profiles_018, cb_sfTube_SFG_profiles_019, cb_sfTube_SFG_profiles_020, cb_sfTube_SFG_profiles_021];
ca_sfTube_SFG_f00_000 = [ [ -125.0000, 0.0000 ],[ 125.0000, 0.0000 ],[ 50.0000, 2004.2143 ],[ -50.0000, 2004.2143 ],[ -125.0000, 0.0000 ] ];
cb_sfTube_SFG_f00_000 = [  0, 1, 2, 3, 4 ];
a_sfTube_SFG_f00 = concat(ca_sfTube_SFG_f00_000);
b_sfTube_SFG_f00 = [cb_sfTube_SFG_f00_000];
ca_sfTube_SFG_f01_000 = [ [ 0.0000, 0.0000 ],[ 249.8251, 9.3487 ],[ 99.9301, 2009.3566 ],[ 0.0000, 2005.6171 ],[ 0.0000, 0.0000 ] ];
cb_sfTube_SFG_f01_000 = [  0, 1, 2, 3, 4 ];
a_sfTube_SFG_f01 = concat(ca_sfTube_SFG_f01_000);
b_sfTube_SFG_f01 = [cb_sfTube_SFG_f01_000];
ca_sfTube_SFG_f02_000 = [ [ 0.0000, 0.0000 ],[ 249.8251, 9.3487 ],[ 99.9301, 2009.3566 ],[ 0.0000, 2005.6171 ],[ 0.0000, 0.0000 ] ];
cb_sfTube_SFG_f02_000 = [  0, 1, 2, 3, 4 ];
a_sfTube_SFG_f02 = concat(ca_sfTube_SFG_f02_000);
b_sfTube_SFG_f02 = [cb_sfTube_SFG_f02_000];
ca_sfTube_SFG_f03_000 = [ [ 0.0000, 0.0000 ],[ 249.8251, 9.3487 ],[ 99.9301, 2009.3566 ],[ 0.0000, 2005.6171 ],[ 0.0000, 0.0000 ] ];
cb_sfTube_SFG_f03_000 = [  0, 1, 2, 3, 4 ];
a_sfTube_SFG_f03 = concat(ca_sfTube_SFG_f03_000);
b_sfTube_SFG_f03 = [cb_sfTube_SFG_f03_000];
ca_sfTube_SFG_f04_000 = [ [ 0.0000, 0.0000 ],[ 249.8251, 9.3487 ],[ 99.9301, 2009.3566 ],[ 0.0000, 2005.6171 ],[ 0.0000, 0.0000 ] ];
cb_sfTube_SFG_f04_000 = [  0, 1, 2, 3, 4 ];
a_sfTube_SFG_f04 = concat(ca_sfTube_SFG_f04_000);
b_sfTube_SFG_f04 = [cb_sfTube_SFG_f04_000];
ca_sfTube_SFG_f05_000 = [ [ 0.0000, 0.0000 ],[ 249.8251, 9.3487 ],[ 99.9301, 2009.3566 ],[ 0.0000, 2005.6171 ],[ 0.0000, 0.0000 ] ];
cb_sfTube_SFG_f05_000 = [  0, 1, 2, 3, 4 ];
a_sfTube_SFG_f05 = concat(ca_sfTube_SFG_f05_000);
b_sfTube_SFG_f05 = [cb_sfTube_SFG_f05_000];
ca_sfTube_SFG_fj00_000 = [ [ 0.0000, 0.0000 ],[ 1.8639, 0.0696 ],[ 3.7175, 0.2779 ],[ 5.5503, 0.6239 ],[ 7.3523, 1.1056 ],[ 9.1133, 1.7202 ],[ 10.8237, 2.4645 ],[ 12.4737, 3.3342 ],[ 14.0543, 4.3245 ],[ 15.5567, 5.4299 ],[ 16.9725, 6.6443 ],[ 18.2938, 7.9608 ],[ 19.5133, 9.3721 ],[ 20.6242, 10.8705 ],[ 21.6202, 12.4475 ],[ 12.9721, 17.4685 ],[ 11.8809, 15.8433 ],[ 10.5873, 14.3741 ],[ 9.1134, 13.0859 ],[ 7.4842, 12.0005 ],[ 5.7276, 11.1366 ],[ 3.8735, 10.5088 ],[ 1.9534, 10.1277 ],[ -0.0000, 10.0000 ],[ 0.0000, 0.0000 ] ];
cb_sfTube_SFG_fj00_000 = [  0, 1, 2, 3, 4, 5, 6, 7, 8, 9, 10, 11, 12, 13, 14, 15, 16, 17, 18, 19, 20, 21, 22, 23, 24 ];
a_sfTube_SFG_fj00 = concat(ca_sfTube_SFG_fj00_000);
b_sfTube_SFG_fj00 = [cb_sfTube_SFG_fj00_000];
ca_sfTube_SFG_fj01_000 = [ [ 0.0000, 0.0000 ],[ 1.8639, 0.0696 ],[ 3.7175, 0.2779 ],[ 5.5503, 0.6239 ],[ 7.3523, 1.1056 ],[ 9.1133, 1.7202 ],[ 10.8237, 2.4645 ],[ 12.4737, 3.3342 ],[ 14.0543, 4.3245 ],[ 15.5567, 5.4299 ],[ 16.9725, 6.6443 ],[ 18.2938, 7.9608 ],[ 19.5133, 9.3721 ],[ 20.6242, 10.8705 ],[ 21.6202, 12.4475 ],[ 12.9721, 17.4685 ],[ 11.8809, 15.8433 ],[ 10.5873, 14.3741 ],[ 9.1134, 13.0859 ],[ 7.4842, 12.0005 ],[ 5.7276, 11.1366 ],[ 3.8735, 10.5088 ],[ 1.9534, 10.1277 ],[ -0.0000, 10.0000 ],[ 0.0000, 0.0000 ] ];
cb_sfTube_SFG_fj01_000 = [  0, 1, 2, 3, 4, 5, 6, 7, 8, 9, 10, 11, 12, 13, 14, 15, 16, 17, 18, 19, 20, 21, 22, 23, 24 ];
a_sfTube_SFG_fj01 = concat(ca_sfTube_SFG_fj01_000);
b_sfTube_SFG_fj01 = [cb_sfTube_SFG_fj01_000];
ca_sfTube_SFG_fj02_000 = [ [ 0.0000, 0.0000 ],[ 1.8639, 0.0696 ],[ 3.7175, 0.2779 ],[ 5.5503, 0.6239 ],[ 7.3523, 1.1056 ],[ 9.1133, 1.7202 ],[ 10.8237, 2.4645 ],[ 12.4737, 3.3342 ],[ 14.0543, 4.3245 ],[ 15.5567, 5.4299 ],[ 16.9725, 6.6443 ],[ 18.2938, 7.9608 ],[ 19.5133, 9.3721 ],[ 20.6242, 10.8705 ],[ 21.6202, 12.4475 ],[ 12.9721, 17.4685 ],[ 11.8809, 15.8433 ],[ 10.5873, 14.3741 ],[ 9.1134, 13.0859 ],[ 7.4842, 12.0005 ],[ 5.7276, 11.1366 ],[ 3.8735, 10.5088 ],[ 1.9534, 10.1277 ],[ -0.0000, 10.0000 ],[ 0.0000, 0.0000 ] ];
cb_sfTube_SFG_fj02_000 = [  0, 1, 2, 3, 4, 5, 6, 7, 8, 9, 10, 11, 12, 13, 14, 15, 16, 17, 18, 19, 20, 21, 22, 23, 24 ];
a_sfTube_SFG_fj02 = concat(ca_sfTube_SFG_fj02_000);
b_sfTube_SFG_fj02 = [cb_sfTube_SFG_fj02_000];
ca_sfTube_SFG_fj03_000 = [ [ 0.0000, 0.0000 ],[ 1.8639, 0.0696 ],[ 3.7175, 0.2779 ],[ 5.5503, 0.6239 ],[ 7.3523, 1.1056 ],[ 9.1133, 1.7202 ],[ 10.8237, 2.4645 ],[ 12.4737, 3.3342 ],[ 14.0543, 4.3245 ],[ 15.5567, 5.4299 ],[ 16.9725, 6.6443 ],[ 18.2938, 7.9608 ],[ 19.5133, 9.3721 ],[ 20.6242, 10.8705 ],[ 21.6202, 12.4475 ],[ 12.9721, 17.4685 ],[ 11.8809, 15.8433 ],[ 10.5873, 14.3741 ],[ 9.1134, 13.0859 ],[ 7.4842, 12.0005 ],[ 5.7276, 11.1366 ],[ 3.8735, 10.5088 ],[ 1.9534, 10.1277 ],[ -0.0000, 10.0000 ],[ 0.0000, 0.0000 ] ];
cb_sfTube_SFG_fj03_000 = [  0, 1, 2, 3, 4, 5, 6, 7, 8, 9, 10, 11, 12, 13, 14, 15, 16, 17, 18, 19, 20, 21, 22, 23, 24 ];
a_sfTube_SFG_fj03 = concat(ca_sfTube_SFG_fj03_000);
b_sfTube_SFG_fj03 = [cb_sfTube_SFG_fj03_000];
ca_sfTube_SFG_fj04_000 = [ [ 0.0000, 0.0000 ],[ 1.8639, 0.0696 ],[ 3.7175, 0.2779 ],[ 5.5503, 0.6239 ],[ 7.3523, 1.1056 ],[ 9.1133, 1.7202 ],[ 10.8237, 2.4645 ],[ 12.4737, 3.3342 ],[ 14.0543, 4.3245 ],[ 15.5567, 5.4299 ],[ 16.9725, 6.6443 ],[ 18.2938, 7.9608 ],[ 19.5133, 9.3721 ],[ 20.6242, 10.8705 ],[ 21.6202, 12.4475 ],[ 12.9721, 17.4685 ],[ 11.8809, 15.8433 ],[ 10.5873, 14.3741 ],[ 9.1134, 13.0859 ],[ 7.4842, 12.0005 ],[ 5.7276, 11.1366 ],[ 3.8735, 10.5088 ],[ 1.9534, 10.1277 ],[ -0.0000, 10.0000 ],[ 0.0000, 0.0000 ] ];
cb_sfTube_SFG_fj04_000 = [  0, 1, 2, 3, 4, 5, 6, 7, 8, 9, 10, 11, 12, 13, 14, 15, 16, 17, 18, 19, 20, 21, 22, 23, 24 ];
a_sfTube_SFG_fj04 = concat(ca_sfTube_SFG_fj04_000);
b_sfTube_SFG_fj04 = [cb_sfTube_SFG_fj04_000];
ca_sfTube_SFG_fj05_000 = [ [ 0.0000, 0.0000 ],[ 1.8639, 0.0696 ],[ 3.7175, 0.2779 ],[ 5.5503, 0.6239 ],[ 7.3523, 1.1056 ],[ 9.1133, 1.7202 ],[ 10.8237, 2.4645 ],[ 12.4737, 3.3342 ],[ 14.0543, 4.3245 ],[ 15.5567, 5.4299 ],[ 16.9725, 6.6443 ],[ 18.2938, 7.9608 ],[ 19.5133, 9.3721 ],[ 20.6242, 10.8705 ],[ 21.6202, 12.4475 ],[ 12.9721, 17.4685 ],[ 11.8809, 15.8433 ],[ 10.5873, 14.3741 ],[ 9.1134, 13.0859 ],[ 7.4842, 12.0005 ],[ 5.7276, 11.1366 ],[ 3.8735, 10.5088 ],[ 1.9534, 10.1277 ],[ -0.0000, 10.0000 ],[ 0.0000, 0.0000 ] ];
cb_sfTube_SFG_fj05_000 = [  0, 1, 2, 3, 4, 5, 6, 7, 8, 9, 10, 11, 12, 13, 14, 15, 16, 17, 18, 19, 20, 21, 22, 23, 24 ];
a_sfTube_SFG_fj05 = concat(ca_sfTube_SFG_fj05_000);
b_sfTube_SFG_fj05 = [cb_sfTube_SFG_fj05_000];

module subpax_sfTube_SFG_f00 () {
	translate( [ 0, 0, 0 ])
		rotate( [ 0, 0, 0 ])
			   linear_extrude(height = 10) polygon(a_sfTube_SFG_f00, b_sfTube_SFG_f00);
}

module subpax_sfTube_SFG_f01 () {
	translate( [ 146.60510978061282, 0.8084880072672543, 12.447487163528859 ])
		rotate( [ -6.0427295803220986e-15, -59.86093357302671, 2.1430738635608098 ])
			   linear_extrude(height = 10) polygon(a_sfTube_SFG_f01, b_sfTube_SFG_f01);
}

module subpax_sfTube_SFG_f02 () {
	translate( [ 271.60510978061296, 16.458394462973605, 253.393559296715 ])
		rotate( [ -172.54139488599233, -60.13808903500675, 177.82079634310642 ])
			   linear_extrude(height = 10) polygon(a_sfTube_SFG_f02, b_sfTube_SFG_f02);
}

module subpax_sfTube_SFG_f03 () {
	translate( [ 125.00000000000014, 31.299812911412722, 481.8921442663724 ])
		rotate( [ -172.5726406312621, -0.2771603671689961, -177.87491577964713 ])
			   linear_extrude(height = 10) polygon(a_sfTube_SFG_f03, b_sfTube_SFG_f03);
}

module subpax_sfTube_SFG_f04 () {
	translate( [ -146.6051097806128, 30.491324904145507, 469.44465710284373 ])
		rotate( [ -165.32734011489978, 59.31343116275702, -169.4715141387681 ])
			   linear_extrude(height = 10) polygon(a_sfTube_SFG_f04, b_sfTube_SFG_f04);
}

module subpax_sfTube_SFG_f05 () {
	translate( [ -271.60510978061313, 14.841418448439196, 228.49858496965768 ])
		rotate( [ -7.335164896070633, 59.58606829052341, -10.632784871596197 ])
			   linear_extrude(height = 10) polygon(a_sfTube_SFG_f05, b_sfTube_SFG_f05);
}

module subpax_sfTube_SFG_fj00 () {
	translate( [ 49.99999999999969, 2004.2143098980207, 0 ])
		rotate( [ 90, 0, 2.143073863560806 ])
			   linear_extrude(height = 2005.6171120131578) polygon(a_sfTube_SFG_fj00, b_sfTube_SFG_fj00);
}

module subpax_sfTube_SFG_fj01 () {
	translate( [ 121.60510978061241, 2010.6359700817566, 98.86792628597975 ])
		rotate( [ 82.66483510392936, -59.586068290523365, 10.632784871596181 ])
			   linear_extrude(height = 2005.6171120131578) polygon(a_sfTube_SFG_fj01, b_sfTube_SFG_fj01);
}

module subpax_sfTube_SFG_fj02 () {
	translate( [ 71.60510978061276, 2017.8661182727596, 210.1833397354885 ])
		rotate( [ -75.32734011489971, -59.313431162757084, 169.47151413876807 ])
			   linear_extrude(height = 2005.6171120131578) polygon(a_sfTube_SFG_fj02, b_sfTube_SFG_fj02);
}

module subpax_sfTube_SFG_fj03 () {
	translate( [ -49.99999999999956, 2018.6746062800266, 222.6308268990175 ])
		rotate( [ -82.57264063126208, 0.27716036716894527, 177.87491577964707 ])
			   linear_extrude(height = 2005.6171120131578) polygon(a_sfTube_SFG_fj03, b_sfTube_SFG_fj03);
}

module subpax_sfTube_SFG_fj04 () {
	translate( [ -121.60510978061235, 2012.2529460962905, 123.76290061303783 ])
		rotate( [ -82.54139488599235, 60.13808903500669, -177.82079634310645 ])
			   linear_extrude(height = 2005.6171120131578) polygon(a_sfTube_SFG_fj04, b_sfTube_SFG_fj04);
}

module subpax_sfTube_SFG_fj05 () {
	translate( [ -71.60510978061275, 2005.0227979052872, 12.447487163529129 ])
		rotate( [ 90, 59.86093357302678, -2.1430738635608106 ])
			   linear_extrude(height = 2005.6171120131578) polygon(a_sfTube_SFG_fj05, b_sfTube_SFG_fj05);
}

module pax_sfTube () {
	union () {
		subpax_sfTube_SFG_f00();
subpax_sfTube_SFG_f01();
subpax_sfTube_SFG_f02();
subpax_sfTube_SFG_f03();
subpax_sfTube_SFG_f04();
subpax_sfTube_SFG_f05();
subpax_sfTube_SFG_fj00();
subpax_sfTube_SFG_fj01();
subpax_sfTube_SFG_fj02();
subpax_sfTube_SFG_fj03();
subpax_sfTube_SFG_fj04();
subpax_sfTube_SFG_fj05();
	}
}

pax_sfTube();
